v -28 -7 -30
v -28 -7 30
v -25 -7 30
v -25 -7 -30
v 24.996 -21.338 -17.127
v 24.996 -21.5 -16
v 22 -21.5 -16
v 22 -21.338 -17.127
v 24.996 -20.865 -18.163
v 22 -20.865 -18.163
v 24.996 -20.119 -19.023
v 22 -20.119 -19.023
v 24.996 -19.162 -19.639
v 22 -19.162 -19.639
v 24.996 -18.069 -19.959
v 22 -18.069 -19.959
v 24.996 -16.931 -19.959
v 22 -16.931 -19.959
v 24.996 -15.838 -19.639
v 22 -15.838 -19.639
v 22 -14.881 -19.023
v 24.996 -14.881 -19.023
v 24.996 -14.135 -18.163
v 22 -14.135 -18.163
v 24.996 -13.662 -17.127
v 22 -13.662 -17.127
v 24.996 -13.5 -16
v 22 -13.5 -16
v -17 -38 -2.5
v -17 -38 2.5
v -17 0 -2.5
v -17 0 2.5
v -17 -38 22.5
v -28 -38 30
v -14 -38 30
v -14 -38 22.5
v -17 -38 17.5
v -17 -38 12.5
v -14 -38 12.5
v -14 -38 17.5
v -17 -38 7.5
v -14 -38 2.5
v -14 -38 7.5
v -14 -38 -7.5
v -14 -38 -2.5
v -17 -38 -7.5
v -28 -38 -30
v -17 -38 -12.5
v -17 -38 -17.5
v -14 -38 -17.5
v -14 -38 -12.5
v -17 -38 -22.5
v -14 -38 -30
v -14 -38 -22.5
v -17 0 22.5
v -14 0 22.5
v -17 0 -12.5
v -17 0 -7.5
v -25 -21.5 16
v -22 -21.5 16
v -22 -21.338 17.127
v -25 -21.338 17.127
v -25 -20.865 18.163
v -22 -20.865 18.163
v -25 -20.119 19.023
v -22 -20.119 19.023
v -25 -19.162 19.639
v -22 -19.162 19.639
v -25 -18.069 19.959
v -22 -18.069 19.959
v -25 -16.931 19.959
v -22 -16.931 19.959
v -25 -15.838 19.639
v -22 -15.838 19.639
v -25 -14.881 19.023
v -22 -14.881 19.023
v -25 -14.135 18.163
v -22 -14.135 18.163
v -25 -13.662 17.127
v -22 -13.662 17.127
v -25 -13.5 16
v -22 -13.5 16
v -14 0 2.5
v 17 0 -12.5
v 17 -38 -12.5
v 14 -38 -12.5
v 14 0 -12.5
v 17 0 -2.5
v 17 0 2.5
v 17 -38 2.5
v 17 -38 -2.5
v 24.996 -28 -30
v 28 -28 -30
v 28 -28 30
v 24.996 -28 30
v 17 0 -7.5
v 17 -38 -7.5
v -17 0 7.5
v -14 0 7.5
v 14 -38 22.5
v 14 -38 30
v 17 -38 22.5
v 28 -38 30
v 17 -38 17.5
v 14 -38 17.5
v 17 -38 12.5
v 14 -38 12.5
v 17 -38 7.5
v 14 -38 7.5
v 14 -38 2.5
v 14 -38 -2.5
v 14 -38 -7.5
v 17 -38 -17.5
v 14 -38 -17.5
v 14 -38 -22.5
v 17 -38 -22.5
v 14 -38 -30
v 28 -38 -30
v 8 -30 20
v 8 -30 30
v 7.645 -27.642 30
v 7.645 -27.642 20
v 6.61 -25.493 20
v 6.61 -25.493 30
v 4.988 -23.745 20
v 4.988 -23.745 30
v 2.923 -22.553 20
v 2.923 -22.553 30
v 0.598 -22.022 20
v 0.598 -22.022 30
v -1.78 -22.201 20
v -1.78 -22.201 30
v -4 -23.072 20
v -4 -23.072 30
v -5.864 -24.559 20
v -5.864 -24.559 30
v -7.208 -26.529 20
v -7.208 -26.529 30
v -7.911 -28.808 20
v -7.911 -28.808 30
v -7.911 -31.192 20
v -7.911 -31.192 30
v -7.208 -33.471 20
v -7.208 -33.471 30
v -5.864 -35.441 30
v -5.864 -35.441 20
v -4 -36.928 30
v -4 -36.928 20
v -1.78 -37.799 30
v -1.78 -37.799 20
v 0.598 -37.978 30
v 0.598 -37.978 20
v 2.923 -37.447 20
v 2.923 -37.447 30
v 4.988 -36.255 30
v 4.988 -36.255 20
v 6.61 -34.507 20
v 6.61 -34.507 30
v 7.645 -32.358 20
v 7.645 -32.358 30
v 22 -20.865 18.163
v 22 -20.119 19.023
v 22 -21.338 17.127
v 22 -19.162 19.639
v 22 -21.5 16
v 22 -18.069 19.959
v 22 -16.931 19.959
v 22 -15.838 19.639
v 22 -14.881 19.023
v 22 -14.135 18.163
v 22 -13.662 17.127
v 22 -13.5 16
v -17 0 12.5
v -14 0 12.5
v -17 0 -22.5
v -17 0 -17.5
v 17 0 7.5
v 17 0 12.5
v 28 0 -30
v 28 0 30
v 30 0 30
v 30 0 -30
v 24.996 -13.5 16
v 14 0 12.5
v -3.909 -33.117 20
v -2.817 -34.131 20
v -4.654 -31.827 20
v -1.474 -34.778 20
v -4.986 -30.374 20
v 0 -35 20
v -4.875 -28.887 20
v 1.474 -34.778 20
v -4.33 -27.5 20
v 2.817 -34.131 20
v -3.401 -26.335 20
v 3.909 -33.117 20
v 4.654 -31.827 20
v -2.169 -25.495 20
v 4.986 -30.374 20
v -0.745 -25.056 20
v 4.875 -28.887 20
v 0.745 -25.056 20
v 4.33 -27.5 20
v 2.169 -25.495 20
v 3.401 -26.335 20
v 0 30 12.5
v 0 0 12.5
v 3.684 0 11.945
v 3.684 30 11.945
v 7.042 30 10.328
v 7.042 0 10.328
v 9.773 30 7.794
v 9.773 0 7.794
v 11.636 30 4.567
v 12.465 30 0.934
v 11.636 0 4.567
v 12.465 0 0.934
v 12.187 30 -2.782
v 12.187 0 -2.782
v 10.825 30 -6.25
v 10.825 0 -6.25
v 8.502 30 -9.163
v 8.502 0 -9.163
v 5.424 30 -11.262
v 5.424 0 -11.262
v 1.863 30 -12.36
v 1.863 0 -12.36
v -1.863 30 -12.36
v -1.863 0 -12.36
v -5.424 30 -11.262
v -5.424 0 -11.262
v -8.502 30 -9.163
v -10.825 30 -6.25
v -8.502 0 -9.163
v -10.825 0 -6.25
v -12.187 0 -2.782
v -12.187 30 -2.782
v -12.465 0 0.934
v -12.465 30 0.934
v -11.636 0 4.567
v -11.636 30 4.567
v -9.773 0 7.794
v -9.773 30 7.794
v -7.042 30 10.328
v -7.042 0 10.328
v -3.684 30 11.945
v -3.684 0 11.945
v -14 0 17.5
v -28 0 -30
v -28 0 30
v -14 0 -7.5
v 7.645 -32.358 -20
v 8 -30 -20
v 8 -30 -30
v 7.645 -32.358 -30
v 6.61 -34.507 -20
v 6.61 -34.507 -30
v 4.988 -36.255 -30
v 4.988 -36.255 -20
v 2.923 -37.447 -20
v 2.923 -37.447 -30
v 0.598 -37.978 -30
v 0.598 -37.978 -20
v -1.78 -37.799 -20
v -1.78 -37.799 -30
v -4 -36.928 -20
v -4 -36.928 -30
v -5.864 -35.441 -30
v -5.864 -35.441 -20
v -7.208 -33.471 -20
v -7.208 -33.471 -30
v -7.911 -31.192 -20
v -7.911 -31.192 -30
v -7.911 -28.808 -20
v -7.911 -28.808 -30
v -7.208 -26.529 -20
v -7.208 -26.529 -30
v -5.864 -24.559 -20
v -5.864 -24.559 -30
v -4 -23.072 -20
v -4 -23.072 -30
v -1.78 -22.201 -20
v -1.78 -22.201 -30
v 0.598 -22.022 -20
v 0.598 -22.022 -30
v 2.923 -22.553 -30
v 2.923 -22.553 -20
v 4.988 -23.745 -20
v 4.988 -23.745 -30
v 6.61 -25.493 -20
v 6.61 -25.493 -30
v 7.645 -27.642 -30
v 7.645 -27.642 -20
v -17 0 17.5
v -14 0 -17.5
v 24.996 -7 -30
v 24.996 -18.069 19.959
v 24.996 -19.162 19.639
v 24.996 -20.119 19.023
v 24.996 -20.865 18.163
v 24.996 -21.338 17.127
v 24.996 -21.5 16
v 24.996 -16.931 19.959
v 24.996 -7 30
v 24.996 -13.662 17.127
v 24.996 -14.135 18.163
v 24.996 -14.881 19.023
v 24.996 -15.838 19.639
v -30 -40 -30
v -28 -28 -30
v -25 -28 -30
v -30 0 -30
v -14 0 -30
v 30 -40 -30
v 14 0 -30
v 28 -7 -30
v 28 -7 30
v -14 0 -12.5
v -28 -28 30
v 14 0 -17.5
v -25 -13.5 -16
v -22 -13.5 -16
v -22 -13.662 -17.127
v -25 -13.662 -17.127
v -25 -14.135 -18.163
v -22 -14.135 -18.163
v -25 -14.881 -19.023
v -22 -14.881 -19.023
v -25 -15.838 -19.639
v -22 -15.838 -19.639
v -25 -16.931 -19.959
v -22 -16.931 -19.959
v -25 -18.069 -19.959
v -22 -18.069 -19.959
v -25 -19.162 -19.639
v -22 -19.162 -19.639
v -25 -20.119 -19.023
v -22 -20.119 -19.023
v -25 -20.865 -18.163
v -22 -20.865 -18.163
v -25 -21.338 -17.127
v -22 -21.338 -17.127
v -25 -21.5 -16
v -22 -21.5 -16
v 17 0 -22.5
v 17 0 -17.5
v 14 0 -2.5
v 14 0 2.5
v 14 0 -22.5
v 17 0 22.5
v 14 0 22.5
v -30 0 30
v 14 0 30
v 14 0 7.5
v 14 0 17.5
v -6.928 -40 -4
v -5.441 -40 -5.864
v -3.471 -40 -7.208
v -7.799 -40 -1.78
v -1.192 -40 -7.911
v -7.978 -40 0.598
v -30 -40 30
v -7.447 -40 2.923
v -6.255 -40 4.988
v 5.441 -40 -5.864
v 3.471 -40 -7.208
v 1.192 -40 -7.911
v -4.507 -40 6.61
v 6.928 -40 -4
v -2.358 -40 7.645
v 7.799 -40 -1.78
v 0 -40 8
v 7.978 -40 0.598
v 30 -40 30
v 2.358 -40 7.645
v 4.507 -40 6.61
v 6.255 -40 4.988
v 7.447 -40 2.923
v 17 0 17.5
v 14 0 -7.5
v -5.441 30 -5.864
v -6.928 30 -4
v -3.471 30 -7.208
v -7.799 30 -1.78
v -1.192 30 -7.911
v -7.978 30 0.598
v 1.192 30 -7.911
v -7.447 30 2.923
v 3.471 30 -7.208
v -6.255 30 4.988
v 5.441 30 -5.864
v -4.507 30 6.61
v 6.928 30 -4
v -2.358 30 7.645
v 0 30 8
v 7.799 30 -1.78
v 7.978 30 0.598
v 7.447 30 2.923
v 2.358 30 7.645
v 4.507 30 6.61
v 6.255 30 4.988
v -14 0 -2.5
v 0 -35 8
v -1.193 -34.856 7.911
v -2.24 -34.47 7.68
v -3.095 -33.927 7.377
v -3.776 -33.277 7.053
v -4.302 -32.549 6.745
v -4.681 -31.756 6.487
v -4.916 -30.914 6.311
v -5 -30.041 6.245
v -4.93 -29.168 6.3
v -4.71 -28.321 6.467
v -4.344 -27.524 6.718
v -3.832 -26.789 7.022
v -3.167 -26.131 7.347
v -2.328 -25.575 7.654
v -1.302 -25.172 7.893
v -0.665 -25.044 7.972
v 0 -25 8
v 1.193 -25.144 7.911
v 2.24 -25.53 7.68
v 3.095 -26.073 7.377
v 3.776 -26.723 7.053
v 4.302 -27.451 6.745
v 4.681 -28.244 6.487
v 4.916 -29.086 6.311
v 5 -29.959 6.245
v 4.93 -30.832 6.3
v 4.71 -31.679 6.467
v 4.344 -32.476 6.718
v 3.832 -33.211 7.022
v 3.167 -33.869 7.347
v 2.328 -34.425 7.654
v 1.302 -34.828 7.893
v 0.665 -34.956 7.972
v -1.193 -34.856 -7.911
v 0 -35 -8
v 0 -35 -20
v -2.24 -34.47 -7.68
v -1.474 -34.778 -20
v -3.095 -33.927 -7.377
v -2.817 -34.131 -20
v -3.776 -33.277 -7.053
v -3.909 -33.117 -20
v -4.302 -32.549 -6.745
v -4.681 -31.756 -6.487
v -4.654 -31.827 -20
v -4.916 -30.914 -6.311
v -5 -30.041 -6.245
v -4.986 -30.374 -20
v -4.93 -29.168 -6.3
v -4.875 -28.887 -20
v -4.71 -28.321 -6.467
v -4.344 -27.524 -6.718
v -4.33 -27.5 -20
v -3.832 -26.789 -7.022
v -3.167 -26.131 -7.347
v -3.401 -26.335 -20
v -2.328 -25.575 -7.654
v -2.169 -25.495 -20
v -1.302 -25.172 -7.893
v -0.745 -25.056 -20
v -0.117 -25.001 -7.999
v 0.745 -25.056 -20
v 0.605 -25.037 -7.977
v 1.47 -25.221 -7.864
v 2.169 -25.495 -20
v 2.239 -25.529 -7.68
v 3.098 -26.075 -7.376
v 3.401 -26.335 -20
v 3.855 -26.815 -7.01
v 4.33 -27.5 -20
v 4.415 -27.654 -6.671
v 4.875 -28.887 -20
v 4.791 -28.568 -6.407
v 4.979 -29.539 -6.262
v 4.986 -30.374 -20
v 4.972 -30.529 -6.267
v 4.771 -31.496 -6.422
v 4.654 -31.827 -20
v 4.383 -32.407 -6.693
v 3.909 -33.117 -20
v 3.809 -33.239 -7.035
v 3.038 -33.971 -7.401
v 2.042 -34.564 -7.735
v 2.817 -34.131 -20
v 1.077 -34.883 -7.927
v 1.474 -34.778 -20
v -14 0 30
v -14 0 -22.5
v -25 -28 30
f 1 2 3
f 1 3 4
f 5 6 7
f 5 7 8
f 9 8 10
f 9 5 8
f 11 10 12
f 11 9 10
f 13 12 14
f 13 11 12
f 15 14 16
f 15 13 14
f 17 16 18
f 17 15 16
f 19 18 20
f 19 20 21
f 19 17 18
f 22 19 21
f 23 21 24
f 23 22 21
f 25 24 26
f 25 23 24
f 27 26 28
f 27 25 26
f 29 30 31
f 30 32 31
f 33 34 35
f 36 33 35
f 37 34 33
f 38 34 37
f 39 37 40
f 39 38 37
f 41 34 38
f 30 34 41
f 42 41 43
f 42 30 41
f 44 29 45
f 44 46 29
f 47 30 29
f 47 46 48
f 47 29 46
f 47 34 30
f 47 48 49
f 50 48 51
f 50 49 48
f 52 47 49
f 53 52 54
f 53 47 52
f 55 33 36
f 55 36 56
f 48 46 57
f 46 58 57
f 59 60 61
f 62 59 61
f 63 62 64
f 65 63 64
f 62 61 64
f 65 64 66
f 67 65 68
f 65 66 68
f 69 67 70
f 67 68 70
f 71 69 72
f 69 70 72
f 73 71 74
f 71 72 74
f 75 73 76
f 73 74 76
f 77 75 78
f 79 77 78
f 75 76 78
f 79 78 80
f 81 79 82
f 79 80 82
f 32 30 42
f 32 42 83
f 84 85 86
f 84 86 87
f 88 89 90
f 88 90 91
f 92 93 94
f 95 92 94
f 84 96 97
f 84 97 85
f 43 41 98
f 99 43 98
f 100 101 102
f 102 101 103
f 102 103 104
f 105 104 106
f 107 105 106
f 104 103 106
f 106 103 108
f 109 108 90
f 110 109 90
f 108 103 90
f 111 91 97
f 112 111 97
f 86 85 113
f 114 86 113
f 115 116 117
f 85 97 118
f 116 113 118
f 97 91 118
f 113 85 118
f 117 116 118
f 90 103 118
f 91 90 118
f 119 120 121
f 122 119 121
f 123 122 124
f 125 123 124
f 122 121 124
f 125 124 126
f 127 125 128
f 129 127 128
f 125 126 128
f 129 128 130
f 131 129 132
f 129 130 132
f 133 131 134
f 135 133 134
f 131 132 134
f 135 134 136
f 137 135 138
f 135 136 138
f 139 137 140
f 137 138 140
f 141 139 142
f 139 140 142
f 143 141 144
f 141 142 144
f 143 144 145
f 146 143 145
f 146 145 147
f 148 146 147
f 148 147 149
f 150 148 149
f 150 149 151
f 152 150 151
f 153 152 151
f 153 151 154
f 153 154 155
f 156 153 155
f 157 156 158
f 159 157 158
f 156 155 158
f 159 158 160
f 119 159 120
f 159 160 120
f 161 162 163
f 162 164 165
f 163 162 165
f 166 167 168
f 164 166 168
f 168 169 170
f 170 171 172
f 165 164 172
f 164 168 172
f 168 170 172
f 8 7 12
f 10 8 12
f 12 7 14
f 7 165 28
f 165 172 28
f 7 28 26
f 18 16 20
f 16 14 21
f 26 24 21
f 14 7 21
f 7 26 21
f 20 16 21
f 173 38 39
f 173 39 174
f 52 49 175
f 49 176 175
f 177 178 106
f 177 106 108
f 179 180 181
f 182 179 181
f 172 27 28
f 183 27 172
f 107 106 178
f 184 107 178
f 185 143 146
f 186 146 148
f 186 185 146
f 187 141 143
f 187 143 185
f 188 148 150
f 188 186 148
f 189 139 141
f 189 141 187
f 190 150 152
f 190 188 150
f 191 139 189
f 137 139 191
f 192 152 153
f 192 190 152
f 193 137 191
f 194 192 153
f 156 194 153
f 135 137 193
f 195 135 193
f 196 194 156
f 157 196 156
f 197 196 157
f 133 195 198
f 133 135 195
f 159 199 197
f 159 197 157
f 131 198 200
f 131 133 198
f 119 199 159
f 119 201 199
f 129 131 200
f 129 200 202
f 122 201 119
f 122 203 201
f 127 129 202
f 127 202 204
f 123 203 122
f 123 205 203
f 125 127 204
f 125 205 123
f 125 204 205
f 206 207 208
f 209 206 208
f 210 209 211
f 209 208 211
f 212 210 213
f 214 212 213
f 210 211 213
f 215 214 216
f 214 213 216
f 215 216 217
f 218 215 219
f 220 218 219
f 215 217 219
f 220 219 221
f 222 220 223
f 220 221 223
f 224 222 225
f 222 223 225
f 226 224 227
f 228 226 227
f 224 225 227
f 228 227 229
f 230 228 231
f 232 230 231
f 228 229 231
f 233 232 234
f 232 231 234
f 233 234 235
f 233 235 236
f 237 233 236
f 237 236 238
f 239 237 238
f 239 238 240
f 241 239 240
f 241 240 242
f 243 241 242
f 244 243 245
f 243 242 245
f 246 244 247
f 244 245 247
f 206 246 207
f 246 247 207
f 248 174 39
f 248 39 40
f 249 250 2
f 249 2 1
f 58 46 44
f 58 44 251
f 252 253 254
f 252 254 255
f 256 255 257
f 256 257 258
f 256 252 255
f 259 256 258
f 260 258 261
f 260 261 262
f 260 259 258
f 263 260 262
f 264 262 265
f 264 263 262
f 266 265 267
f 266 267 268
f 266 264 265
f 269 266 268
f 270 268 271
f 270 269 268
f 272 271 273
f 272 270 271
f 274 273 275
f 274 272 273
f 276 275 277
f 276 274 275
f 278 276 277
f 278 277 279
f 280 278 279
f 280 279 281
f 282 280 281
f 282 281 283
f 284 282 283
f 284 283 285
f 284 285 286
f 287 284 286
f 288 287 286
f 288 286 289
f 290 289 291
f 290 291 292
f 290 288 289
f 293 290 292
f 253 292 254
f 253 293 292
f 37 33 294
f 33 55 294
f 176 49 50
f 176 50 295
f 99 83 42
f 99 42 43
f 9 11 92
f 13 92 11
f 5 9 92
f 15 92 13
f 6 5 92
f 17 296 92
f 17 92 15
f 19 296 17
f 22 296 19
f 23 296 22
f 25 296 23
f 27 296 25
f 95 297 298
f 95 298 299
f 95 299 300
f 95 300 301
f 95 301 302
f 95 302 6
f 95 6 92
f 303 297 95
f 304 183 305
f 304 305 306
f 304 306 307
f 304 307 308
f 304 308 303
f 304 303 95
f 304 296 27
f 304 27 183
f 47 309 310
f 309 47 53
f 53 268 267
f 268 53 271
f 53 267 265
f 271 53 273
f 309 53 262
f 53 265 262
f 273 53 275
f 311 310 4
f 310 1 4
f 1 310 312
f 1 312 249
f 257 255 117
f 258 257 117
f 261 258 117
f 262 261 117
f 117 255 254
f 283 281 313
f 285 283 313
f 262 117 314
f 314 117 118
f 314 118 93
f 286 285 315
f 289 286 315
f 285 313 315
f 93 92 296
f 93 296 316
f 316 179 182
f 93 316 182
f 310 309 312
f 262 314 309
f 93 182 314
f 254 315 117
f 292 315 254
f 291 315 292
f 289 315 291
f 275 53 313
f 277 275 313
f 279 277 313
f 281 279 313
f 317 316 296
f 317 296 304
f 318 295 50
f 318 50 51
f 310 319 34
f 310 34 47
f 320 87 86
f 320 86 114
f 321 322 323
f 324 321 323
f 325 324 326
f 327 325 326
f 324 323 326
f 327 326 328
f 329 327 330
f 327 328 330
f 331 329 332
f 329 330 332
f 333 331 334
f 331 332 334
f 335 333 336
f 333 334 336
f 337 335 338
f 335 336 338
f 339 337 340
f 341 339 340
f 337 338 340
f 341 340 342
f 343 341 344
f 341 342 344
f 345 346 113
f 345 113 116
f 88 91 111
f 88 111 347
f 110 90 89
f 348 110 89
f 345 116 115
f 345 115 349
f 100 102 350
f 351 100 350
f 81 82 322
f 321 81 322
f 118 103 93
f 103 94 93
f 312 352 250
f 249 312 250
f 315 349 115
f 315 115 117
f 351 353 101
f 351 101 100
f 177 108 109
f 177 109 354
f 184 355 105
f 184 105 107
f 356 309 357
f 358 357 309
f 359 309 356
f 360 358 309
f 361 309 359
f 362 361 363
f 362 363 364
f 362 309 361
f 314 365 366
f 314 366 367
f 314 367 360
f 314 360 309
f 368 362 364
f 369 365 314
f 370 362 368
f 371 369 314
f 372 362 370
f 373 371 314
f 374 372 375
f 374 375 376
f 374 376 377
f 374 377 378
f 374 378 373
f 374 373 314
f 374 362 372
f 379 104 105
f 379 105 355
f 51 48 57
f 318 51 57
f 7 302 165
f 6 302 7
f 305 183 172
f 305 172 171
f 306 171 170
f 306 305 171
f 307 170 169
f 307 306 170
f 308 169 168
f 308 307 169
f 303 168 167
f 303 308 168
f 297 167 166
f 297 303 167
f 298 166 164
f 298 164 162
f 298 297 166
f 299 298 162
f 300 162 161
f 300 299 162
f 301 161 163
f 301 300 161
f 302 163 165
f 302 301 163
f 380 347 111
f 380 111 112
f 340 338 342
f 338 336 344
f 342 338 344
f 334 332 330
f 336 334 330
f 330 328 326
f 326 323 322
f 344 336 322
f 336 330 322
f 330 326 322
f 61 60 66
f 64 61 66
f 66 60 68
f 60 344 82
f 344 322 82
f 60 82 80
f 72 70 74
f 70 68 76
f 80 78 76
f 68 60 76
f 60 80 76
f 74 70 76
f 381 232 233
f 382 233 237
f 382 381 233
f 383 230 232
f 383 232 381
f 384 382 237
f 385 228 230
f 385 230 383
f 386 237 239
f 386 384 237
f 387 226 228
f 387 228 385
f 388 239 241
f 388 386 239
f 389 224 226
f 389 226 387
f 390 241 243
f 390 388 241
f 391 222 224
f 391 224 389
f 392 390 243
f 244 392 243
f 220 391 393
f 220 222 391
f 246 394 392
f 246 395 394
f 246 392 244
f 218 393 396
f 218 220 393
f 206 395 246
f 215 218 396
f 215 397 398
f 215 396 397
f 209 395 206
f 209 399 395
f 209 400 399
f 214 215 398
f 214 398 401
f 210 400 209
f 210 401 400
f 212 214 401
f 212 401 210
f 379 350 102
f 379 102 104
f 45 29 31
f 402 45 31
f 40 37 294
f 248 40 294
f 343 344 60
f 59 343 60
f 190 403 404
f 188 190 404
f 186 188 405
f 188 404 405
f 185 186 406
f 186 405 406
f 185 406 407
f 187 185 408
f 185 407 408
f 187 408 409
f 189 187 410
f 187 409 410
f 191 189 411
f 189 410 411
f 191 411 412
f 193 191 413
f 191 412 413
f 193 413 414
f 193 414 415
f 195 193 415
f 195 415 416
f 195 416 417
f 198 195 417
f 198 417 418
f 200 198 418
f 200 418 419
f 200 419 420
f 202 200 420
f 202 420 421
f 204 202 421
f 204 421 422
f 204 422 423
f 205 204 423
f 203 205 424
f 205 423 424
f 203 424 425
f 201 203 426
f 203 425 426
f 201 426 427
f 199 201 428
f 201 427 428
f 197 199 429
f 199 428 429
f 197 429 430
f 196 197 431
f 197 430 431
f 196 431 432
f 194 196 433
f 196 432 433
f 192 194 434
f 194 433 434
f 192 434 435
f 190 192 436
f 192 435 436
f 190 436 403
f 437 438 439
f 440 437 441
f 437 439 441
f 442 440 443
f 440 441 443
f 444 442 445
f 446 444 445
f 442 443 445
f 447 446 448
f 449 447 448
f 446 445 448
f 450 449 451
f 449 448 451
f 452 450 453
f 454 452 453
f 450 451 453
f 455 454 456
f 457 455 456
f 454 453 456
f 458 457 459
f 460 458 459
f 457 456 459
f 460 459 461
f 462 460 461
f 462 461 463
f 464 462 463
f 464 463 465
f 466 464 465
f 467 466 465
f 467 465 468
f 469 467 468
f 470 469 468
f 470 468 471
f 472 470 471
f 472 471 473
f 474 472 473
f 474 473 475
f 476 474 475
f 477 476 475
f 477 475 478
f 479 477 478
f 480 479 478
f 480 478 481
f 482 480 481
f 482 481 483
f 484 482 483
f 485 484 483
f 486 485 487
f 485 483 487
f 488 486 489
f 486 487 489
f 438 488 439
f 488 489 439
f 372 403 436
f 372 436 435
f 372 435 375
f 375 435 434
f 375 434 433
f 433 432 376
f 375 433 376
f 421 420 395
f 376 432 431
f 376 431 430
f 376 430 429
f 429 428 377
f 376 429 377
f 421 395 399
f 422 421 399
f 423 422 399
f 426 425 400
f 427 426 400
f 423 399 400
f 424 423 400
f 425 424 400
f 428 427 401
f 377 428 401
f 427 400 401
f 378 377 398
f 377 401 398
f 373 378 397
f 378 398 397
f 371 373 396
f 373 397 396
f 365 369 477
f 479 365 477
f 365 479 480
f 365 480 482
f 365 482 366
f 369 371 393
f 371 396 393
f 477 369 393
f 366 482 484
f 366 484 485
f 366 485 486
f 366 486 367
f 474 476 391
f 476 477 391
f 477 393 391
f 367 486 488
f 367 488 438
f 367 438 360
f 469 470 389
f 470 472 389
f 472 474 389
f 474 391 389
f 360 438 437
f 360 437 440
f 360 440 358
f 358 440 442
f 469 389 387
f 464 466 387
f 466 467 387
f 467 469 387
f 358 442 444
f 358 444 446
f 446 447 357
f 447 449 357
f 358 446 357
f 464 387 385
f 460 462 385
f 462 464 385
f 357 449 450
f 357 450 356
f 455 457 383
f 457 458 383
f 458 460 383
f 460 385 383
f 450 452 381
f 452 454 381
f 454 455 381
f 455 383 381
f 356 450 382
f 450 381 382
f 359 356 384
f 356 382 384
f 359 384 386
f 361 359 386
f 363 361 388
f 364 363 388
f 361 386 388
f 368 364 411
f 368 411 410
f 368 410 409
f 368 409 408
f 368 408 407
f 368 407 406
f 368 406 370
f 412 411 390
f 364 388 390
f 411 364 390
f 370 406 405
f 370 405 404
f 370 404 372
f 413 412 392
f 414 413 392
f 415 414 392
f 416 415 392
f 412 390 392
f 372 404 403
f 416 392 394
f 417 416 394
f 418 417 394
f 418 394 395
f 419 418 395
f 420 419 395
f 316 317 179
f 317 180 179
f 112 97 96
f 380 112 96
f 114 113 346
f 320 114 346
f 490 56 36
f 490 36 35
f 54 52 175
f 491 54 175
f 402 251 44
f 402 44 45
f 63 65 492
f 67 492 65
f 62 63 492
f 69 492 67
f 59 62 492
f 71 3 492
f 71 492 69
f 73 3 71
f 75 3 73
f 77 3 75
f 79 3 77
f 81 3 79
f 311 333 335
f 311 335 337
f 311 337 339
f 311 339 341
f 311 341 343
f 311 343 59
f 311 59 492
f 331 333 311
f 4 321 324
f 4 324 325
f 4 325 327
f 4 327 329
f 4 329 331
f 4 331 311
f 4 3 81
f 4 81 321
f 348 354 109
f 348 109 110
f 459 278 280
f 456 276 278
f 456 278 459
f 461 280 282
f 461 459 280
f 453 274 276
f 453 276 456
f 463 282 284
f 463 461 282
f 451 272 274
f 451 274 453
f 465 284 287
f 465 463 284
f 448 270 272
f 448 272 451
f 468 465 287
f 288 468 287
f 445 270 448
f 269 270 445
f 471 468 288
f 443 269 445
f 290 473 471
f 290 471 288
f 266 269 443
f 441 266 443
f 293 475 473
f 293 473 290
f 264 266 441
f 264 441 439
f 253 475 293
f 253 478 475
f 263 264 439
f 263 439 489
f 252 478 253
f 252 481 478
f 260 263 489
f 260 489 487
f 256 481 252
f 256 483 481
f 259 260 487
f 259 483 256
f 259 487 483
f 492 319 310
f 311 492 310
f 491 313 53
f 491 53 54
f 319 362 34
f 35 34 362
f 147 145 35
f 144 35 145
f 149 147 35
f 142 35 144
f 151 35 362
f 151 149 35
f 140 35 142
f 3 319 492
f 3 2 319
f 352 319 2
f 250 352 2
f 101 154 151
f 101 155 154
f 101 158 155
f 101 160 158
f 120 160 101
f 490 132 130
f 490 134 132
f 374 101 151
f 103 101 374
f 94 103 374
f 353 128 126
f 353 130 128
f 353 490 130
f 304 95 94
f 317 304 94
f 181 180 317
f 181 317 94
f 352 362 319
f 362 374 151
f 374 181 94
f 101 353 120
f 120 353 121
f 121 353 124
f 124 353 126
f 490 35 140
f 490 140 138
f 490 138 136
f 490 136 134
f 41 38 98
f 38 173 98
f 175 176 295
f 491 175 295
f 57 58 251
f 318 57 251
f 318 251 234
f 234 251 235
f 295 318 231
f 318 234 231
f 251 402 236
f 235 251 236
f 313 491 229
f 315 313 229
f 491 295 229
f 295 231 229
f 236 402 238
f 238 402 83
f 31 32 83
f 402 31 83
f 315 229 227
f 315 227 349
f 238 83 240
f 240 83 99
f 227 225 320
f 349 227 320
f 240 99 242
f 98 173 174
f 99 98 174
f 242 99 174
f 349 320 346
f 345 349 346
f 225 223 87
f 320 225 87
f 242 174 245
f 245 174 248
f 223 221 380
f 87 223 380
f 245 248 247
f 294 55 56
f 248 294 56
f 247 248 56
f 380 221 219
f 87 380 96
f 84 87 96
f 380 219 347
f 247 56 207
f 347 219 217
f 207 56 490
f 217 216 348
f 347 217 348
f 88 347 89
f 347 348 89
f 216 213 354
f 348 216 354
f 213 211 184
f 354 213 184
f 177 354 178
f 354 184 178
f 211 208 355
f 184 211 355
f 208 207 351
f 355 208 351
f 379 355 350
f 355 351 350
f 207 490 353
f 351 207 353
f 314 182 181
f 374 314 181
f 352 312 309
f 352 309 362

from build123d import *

# Parameters (mm, degrees)
ESBO_O1_R                = 12.5
RESSALTO_EXTRUS_O1_DEPTH = 30
ESBO_O2_R                = 8
CORTE_EXTRUS_O1_DEPTH    = 15
ESBO_O3_W                = 3
ESBO_O3_H                = 5
CORTE_EXTRUS_O2_DEPTH    = 6.5
ESBO_O4_W                = 60
ESBO_O4_H                = 60
RESSALTO_EXTRUS_O2_DEPTH = 40
ESBO_O5_W                = 11
ESBO_O5_H                = 60
CORTE_EXTRUS_O3_DEPTH    = 35
ESBO_O6_W                = 11
ESBO_O6_H                = 60
CORTE_EXTRUS_O4_DEPTH    = 38
ESBO_O7_W                = 60
ESBO_O7_H                = 21
RESSALTO_EXTRUS_O3_DEPTH = 3.00002654
ESBO_O8_W                = 60
ESBO_O8_H                = 21
RESSALTO_EXTRUS_O4_DEPTH = 3.004451555
RESSALTO_EXTRUS_O5_DEPTH = 2.995218695
RESSALTO_EXTRUS_O6_START = 3
RESSALTO_EXTRUS_O6_DEPTH = 3
ESBO_O15_R               = 8
CORTE_EXTRUS_O5_DEPTH    = 70.462219947
ESBO_O19_W               = 5
ESBO_O19_H               = 38
ESBO_O19_W_2             = 7.5
CORTE_EXTRUS_O7_DEPTH    = 3
ESBO_O20_W               = 7.5
ESBO_O20_H               = 38
ESBO_O20_W_2             = 5
CORTE_EXTRUS_O8_DEPTH    = 3
ESBO_O21_R               = 8
CORTE_EXTRUS_O9_DEPTH    = 10
CORTE_EXTRUS_O10_START   = -10
ESBO_O22_R               = 8
CORTE_EXTRUS_O10_DEPTH   = 10
ESBO_O24_R               = 5
CORTE_EXTRUS_O11_DEPTH   = 71.710678119


with BuildPart() as part:
    # Esboço1 → Ressalto-extrusão1 (new body)
    with BuildSketch(Plane(origin=(0, 0, 0), x_dir=(1, 0, 0), z_dir=(0, 1, 0))):
        with Locations(Location((0, 0, 0), (0, 0, 270))):
            Circle(ESBO_O1_R)
    extrude(amount=RESSALTO_EXTRUS_O1_DEPTH)

    # Esboço2 → Corte-extrusão1 (cut)
    with BuildSketch(Plane(origin=(0, 30, 0), x_dir=(1, 0, 0), z_dir=(0, 1, 0))):
        with Locations(Location((0, 0, 0), (0, 0, 270))):
            Circle(ESBO_O2_R)
    extrude(amount=-CORTE_EXTRUS_O1_DEPTH, mode=Mode.SUBTRACT)

    # Esboço3 → Corte-extrusão2 (cut)
    with BuildSketch(Plane.XZ):
        Rectangle(ESBO_O3_W, ESBO_O3_H)
    extrude(amount=-CORTE_EXTRUS_O2_DEPTH, mode=Mode.SUBTRACT)

    # Esboço4 → Ressalto-extrusão2 (add)
    with BuildSketch(Plane.XZ):
        Rectangle(ESBO_O4_W, ESBO_O4_H)
    extrude(amount=RESSALTO_EXTRUS_O2_DEPTH)

    # Esboço5 → Corte-extrusão3 (cut)
    with BuildSketch(Plane(origin=(0, 0, 0), x_dir=(1, 0, 0), z_dir=(0, 1, 0))):
        with Locations((-22.5, 0)):
            Rectangle(ESBO_O5_W, ESBO_O5_H)
        with Locations((22.5, 0)):
            Rectangle(ESBO_O5_W, ESBO_O5_H)
    extrude(amount=-CORTE_EXTRUS_O3_DEPTH, mode=Mode.SUBTRACT)

    # Esboço6 → Corte-extrusão4 (cut)
    with BuildSketch(Plane(origin=(0, 0, 0), x_dir=(1, 0, 0), z_dir=(0, 1, 0))):
        with Locations((-22.5, 0)):
            Rectangle(ESBO_O6_W, ESBO_O6_H)
        with Locations((22.5, 0)):
            Rectangle(ESBO_O6_W, ESBO_O6_H)
    extrude(amount=-CORTE_EXTRUS_O4_DEPTH, mode=Mode.SUBTRACT)

    # Esboço7 → Ressalto-extrusão3 (add)
    with BuildSketch(Plane(origin=(-28, 0, 0), x_dir=(0, 0, -1), z_dir=(1, 0, 0))):
        with Locations((0, -17.5)):
            Rectangle(ESBO_O7_W, ESBO_O7_H)
    extrude(amount=RESSALTO_EXTRUS_O3_DEPTH)

    # Esboço8 → Ressalto-extrusão4 (add)
    with BuildSketch(Plane.ZY.offset(-28)):
        with Locations((0, -17.5)):
            Rectangle(ESBO_O8_W, ESBO_O8_H)
    extrude(amount=RESSALTO_EXTRUS_O4_DEPTH)

    # Esboço9 → Ressalto-extrusão5 (add)
    with BuildSketch(Plane.ZY.offset(-24.995548445)):
        with BuildLine():
            Line((-16, -13.5), (16, -13.5))
            ThreePointArc((16, -13.5), (20, -17.5), (16, -21.5))
            Line((16, -21.5), (-16, -21.5))
            ThreePointArc((-16, -21.5), (-20, -17.5), (-16, -13.5))
        make_face()
    extrude(amount=RESSALTO_EXTRUS_O5_DEPTH)

    # Esboço14 → Ressalto-extrusão6 (add)
    with BuildSketch(Plane(origin=(-24.99997346, 0, 0), x_dir=(0, 0, -1), z_dir=(1, 0, 0)).offset(RESSALTO_EXTRUS_O6_START)):
        with BuildLine():
            Line((-16, -13.5), (16, -13.5))
            ThreePointArc((16, -13.5), (20, -17.5), (16, -21.5))
            Line((16, -21.5), (-16, -21.5))
            ThreePointArc((-16, -21.5), (-20, -17.5), (-16, -13.5))
        make_face()
    extrude(amount=-RESSALTO_EXTRUS_O6_DEPTH)

    # Esboço15 → Corte-extrusão5 (cut, through all)
    with BuildSketch(Plane(origin=(0, 15, 0), x_dir=(1, 0, 0), z_dir=(0, 1, 0))):
        with Locations(Location((0, 0, 0), (0, 0, 270))):
            Circle(ESBO_O15_R)
    extrude(amount=-CORTE_EXTRUS_O5_DEPTH, mode=Mode.SUBTRACT)

    # Esboço19 → Corte-extrusão7 (cut)
    with BuildSketch(Plane.ZY.offset(17)):
        with Locations((-15, -19)):
            Rectangle(ESBO_O19_W, ESBO_O19_H)
        with Locations((-26.25, -19)):
            Rectangle(ESBO_O19_W_2, ESBO_O19_H)
        with Locations((-5, -19)):
            Rectangle(ESBO_O19_W, ESBO_O19_H)
        with Locations((5, -19)):
            Rectangle(ESBO_O19_W, ESBO_O19_H)
        with Locations((15, -19)):
            Rectangle(ESBO_O19_W, ESBO_O19_H)
        with Locations((26.25, -19)):
            Rectangle(ESBO_O19_W_2, ESBO_O19_H)
    extrude(amount=-CORTE_EXTRUS_O7_DEPTH, mode=Mode.SUBTRACT)

    # Esboço20 → Corte-extrusão8 (cut)
    with BuildSketch(Plane(origin=(17, 0, 0), x_dir=(0, 0, -1), z_dir=(1, 0, 0))):
        with Locations((-26.25, -19)):
            Rectangle(ESBO_O20_W, ESBO_O20_H)
        with Locations((-15, -19)):
            Rectangle(ESBO_O20_W_2, ESBO_O20_H)
        with Locations((-5, -19)):
            Rectangle(ESBO_O20_W_2, ESBO_O20_H)
        with Locations((5, -19)):
            Rectangle(ESBO_O20_W_2, ESBO_O20_H)
        with Locations((15, -19)):
            Rectangle(ESBO_O20_W_2, ESBO_O20_H)
        with Locations((26.25, -19)):
            Rectangle(ESBO_O20_W, ESBO_O20_H)
    extrude(amount=-CORTE_EXTRUS_O8_DEPTH, mode=Mode.SUBTRACT)

    # Esboço21 → Corte-extrusão9 (cut)
    with BuildSketch(Plane.XY.offset(30)):
        with Locations((0, -30)):
            Circle(ESBO_O21_R)
    extrude(amount=-CORTE_EXTRUS_O9_DEPTH, mode=Mode.SUBTRACT)

    # Esboço22 → Corte-extrusão10 (cut)
    with BuildSketch(Plane(origin=(0, 0, -30), x_dir=(-1, 0, 0), z_dir=(0, 0, -1)).offset(CORTE_EXTRUS_O10_START)):
        with Locations(Location((0, -30, 0), (0, 0, 180))):
            Circle(ESBO_O22_R)
    extrude(amount=CORTE_EXTRUS_O10_DEPTH, mode=Mode.SUBTRACT)

    # Esboço24 → Corte-extrusão11 (cut, through all)
    with BuildSketch(Plane(origin=(0, 0, -20), x_dir=(-1, 0, 0), z_dir=(0, 0, -1))):
        with Locations(Location((0, -30, 0), (0, 0, 270))):
            Circle(ESBO_O24_R)
    extrude(amount=-CORTE_EXTRUS_O11_DEPTH, mode=Mode.SUBTRACT)


solid = part.part
